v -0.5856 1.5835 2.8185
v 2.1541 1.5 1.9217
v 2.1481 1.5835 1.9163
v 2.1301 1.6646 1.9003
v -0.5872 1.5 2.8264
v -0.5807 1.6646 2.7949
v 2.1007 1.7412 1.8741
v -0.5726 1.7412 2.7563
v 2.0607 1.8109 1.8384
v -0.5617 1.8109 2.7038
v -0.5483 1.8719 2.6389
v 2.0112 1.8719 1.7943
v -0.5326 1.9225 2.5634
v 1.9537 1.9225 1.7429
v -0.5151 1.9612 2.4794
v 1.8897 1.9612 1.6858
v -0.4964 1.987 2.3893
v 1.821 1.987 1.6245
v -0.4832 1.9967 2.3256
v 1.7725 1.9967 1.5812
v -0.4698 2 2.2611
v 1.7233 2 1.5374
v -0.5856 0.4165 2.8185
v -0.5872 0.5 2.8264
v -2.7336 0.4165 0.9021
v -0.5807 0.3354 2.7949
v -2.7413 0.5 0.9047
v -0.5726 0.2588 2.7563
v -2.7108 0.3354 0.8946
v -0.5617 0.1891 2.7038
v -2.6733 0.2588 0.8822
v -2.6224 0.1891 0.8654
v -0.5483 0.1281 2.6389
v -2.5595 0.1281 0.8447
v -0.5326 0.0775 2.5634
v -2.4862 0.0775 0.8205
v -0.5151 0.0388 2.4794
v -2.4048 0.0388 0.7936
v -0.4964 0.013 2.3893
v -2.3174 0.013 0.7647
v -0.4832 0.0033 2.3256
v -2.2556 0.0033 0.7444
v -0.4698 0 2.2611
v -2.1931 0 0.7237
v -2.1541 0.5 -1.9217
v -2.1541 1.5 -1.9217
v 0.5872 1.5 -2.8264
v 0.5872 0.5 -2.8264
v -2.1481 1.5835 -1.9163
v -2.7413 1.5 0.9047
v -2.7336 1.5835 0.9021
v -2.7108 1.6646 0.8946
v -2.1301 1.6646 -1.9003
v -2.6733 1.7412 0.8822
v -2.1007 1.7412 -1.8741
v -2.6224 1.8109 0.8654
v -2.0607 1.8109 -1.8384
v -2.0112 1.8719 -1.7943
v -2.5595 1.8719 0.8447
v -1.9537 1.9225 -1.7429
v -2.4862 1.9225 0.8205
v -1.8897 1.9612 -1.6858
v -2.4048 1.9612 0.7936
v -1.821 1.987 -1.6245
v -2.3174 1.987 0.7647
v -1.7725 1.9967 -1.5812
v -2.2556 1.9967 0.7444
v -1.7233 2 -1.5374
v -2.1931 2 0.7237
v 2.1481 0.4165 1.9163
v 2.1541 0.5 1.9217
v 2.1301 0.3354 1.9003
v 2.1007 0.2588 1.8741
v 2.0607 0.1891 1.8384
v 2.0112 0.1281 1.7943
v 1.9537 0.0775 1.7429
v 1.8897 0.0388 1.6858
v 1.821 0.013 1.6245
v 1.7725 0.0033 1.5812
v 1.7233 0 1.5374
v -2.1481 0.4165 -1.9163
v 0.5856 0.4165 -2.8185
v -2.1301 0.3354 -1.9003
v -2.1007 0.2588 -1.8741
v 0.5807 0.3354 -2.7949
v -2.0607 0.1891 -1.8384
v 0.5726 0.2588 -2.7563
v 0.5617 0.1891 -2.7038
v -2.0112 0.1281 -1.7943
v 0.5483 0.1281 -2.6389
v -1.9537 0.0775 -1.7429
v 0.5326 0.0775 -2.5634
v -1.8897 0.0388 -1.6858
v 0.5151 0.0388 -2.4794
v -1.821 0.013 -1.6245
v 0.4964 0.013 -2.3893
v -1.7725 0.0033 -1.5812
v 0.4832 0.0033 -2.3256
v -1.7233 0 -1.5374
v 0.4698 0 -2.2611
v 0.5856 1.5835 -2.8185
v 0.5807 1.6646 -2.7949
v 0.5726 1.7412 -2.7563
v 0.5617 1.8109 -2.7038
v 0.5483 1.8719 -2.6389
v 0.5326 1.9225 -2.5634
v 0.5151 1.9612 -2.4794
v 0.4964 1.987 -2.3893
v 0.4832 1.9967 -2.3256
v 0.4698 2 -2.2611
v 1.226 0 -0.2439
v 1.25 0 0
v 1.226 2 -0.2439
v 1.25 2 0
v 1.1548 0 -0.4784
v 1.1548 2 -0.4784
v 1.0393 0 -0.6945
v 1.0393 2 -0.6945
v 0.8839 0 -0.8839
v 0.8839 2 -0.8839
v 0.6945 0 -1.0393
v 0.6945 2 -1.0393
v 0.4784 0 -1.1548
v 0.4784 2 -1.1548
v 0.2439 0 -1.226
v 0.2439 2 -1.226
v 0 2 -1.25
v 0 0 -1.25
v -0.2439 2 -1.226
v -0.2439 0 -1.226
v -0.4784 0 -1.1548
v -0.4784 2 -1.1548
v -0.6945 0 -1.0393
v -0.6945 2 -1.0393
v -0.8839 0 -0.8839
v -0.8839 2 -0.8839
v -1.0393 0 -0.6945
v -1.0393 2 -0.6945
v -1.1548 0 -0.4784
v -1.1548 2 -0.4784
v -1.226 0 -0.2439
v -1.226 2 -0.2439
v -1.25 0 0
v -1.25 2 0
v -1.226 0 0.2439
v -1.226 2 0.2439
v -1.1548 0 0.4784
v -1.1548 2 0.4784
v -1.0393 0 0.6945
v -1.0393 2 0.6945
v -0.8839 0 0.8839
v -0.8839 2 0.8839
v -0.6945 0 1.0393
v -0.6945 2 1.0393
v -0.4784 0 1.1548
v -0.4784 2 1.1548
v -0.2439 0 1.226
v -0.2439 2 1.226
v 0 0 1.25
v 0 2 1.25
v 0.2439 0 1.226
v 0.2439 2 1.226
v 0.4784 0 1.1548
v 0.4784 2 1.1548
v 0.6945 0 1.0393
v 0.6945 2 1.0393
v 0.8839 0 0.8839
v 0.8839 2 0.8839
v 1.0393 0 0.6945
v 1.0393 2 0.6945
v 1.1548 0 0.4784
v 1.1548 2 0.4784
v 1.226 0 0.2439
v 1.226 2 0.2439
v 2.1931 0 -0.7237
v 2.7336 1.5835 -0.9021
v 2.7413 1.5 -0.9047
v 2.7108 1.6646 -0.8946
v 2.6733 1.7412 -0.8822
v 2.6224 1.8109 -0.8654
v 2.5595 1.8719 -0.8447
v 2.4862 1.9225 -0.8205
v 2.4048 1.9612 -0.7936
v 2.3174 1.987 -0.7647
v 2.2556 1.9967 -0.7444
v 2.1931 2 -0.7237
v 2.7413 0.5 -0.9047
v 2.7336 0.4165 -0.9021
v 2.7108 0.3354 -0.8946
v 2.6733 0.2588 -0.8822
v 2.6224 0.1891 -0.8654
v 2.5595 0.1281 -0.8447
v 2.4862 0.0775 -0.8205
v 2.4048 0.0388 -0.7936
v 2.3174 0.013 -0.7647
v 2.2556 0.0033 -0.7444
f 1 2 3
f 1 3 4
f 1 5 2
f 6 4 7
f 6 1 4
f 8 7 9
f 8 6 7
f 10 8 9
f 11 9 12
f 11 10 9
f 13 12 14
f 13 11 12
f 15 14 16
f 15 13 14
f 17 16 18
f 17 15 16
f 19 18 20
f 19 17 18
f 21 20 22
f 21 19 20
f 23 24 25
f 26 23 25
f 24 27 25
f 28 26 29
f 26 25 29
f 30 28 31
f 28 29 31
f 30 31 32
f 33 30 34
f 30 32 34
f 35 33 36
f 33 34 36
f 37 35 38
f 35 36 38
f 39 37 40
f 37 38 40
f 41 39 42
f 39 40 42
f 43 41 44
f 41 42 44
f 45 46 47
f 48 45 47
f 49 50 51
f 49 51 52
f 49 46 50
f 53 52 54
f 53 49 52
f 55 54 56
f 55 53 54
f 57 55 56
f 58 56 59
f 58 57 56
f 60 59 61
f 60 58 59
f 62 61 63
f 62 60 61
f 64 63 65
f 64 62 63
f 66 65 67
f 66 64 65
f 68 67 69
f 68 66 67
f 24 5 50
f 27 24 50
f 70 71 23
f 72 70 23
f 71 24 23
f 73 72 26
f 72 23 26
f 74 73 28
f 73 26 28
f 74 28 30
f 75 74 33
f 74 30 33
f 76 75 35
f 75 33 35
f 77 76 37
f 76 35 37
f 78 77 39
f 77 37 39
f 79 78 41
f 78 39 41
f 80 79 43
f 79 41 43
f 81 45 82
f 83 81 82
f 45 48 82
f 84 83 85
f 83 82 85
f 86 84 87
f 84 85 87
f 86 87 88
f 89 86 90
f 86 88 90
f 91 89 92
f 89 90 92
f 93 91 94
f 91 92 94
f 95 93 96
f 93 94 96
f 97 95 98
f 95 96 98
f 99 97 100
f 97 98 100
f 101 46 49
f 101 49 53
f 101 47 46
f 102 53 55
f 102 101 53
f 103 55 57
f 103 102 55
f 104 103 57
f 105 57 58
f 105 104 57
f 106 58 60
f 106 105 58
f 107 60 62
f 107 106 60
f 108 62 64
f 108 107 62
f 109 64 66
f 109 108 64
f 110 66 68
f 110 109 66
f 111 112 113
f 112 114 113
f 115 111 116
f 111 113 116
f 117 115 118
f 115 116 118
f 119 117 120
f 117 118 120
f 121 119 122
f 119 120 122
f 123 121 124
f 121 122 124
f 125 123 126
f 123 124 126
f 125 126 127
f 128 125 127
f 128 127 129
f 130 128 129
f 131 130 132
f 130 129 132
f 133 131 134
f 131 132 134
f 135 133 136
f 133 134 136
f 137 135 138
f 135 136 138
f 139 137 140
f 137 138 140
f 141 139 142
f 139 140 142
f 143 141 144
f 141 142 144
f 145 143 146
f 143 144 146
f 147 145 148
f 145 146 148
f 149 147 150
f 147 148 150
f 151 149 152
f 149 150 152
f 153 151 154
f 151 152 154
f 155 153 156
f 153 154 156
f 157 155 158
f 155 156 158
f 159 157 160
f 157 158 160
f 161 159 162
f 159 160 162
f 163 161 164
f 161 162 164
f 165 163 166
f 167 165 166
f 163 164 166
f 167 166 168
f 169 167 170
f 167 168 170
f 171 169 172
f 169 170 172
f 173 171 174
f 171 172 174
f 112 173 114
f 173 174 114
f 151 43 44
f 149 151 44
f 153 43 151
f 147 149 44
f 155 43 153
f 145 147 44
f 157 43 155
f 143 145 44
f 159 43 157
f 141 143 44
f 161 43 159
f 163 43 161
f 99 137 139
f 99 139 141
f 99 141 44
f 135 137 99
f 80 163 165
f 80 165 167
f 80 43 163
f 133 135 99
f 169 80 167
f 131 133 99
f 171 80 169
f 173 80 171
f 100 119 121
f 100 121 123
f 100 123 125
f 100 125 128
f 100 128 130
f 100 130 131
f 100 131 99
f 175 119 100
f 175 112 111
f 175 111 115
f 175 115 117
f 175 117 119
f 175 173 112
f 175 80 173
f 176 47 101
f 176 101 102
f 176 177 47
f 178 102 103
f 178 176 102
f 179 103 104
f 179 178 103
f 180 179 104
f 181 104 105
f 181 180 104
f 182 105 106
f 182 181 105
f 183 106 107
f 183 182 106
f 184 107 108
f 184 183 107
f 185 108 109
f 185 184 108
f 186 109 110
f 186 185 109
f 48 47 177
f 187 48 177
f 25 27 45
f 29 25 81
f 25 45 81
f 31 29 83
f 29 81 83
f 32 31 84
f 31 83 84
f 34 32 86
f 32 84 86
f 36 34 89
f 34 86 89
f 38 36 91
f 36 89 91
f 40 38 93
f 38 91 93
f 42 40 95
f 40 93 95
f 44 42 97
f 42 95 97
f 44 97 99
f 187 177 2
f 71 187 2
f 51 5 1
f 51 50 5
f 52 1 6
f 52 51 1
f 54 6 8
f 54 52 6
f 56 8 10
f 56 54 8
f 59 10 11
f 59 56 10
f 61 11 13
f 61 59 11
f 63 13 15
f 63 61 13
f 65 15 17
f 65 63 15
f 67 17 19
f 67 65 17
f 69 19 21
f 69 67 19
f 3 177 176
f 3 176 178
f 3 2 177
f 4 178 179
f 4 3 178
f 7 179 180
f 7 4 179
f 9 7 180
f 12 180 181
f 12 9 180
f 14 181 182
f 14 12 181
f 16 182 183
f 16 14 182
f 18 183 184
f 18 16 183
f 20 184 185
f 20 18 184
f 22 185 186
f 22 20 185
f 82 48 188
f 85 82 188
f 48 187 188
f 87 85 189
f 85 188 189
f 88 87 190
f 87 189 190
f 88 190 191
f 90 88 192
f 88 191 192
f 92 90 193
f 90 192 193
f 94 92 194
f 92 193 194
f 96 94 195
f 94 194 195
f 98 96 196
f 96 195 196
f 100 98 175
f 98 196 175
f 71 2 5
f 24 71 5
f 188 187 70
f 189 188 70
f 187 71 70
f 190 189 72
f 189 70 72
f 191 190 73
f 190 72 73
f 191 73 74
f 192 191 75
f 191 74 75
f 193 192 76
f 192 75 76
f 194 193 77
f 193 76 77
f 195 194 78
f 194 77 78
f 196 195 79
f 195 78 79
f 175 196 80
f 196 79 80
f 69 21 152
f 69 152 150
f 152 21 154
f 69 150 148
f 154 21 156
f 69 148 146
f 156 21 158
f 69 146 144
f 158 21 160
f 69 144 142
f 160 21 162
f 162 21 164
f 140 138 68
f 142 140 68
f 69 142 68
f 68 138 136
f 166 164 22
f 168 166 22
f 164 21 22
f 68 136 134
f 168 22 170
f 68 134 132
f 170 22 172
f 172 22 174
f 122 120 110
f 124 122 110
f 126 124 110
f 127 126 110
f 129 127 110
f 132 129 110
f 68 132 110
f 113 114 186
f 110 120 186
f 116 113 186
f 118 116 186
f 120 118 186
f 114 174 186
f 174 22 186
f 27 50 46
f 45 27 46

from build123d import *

# Parameters (mm, degrees)
F3_R = 0.5
F4_R = 1.25


with BuildPart() as f2:
    # F2: sweep along a path in F1
    with BuildLine(Plane.XY) as f2_path:
        Line((0, 0), (0, 2))
    # F0 (on Front) → F2 (sweep)
    with BuildSketch(Plane.XZ):
        Polygon((-0.5872089498, 2.8263968197), (-2.741335922, 0.904660542), (-2.1541269722, -1.9217362777), (0.5872089498, -2.8263968197), (2.741335922, -0.904660542), (2.1541269722, 1.9217362777), align=None)
    sweep(path=f2_path.line)

    # F3
    f3_edges = [f2.edges().sort_by_distance(p)[0] for p in [
        (-2.447731, 0, -0.508538),
        (-1.664272, 0, 1.865529),
        (0.783459, 0, 2.374067),
        (2.447731, 0, 0.508538),
        (1.664272, 0, -1.865529),
        (-0.783459, 0, -2.374067),
        (-1.664272, 2, 1.865529),
        (0.783459, 2, 2.374067),
        (2.447731, 2, 0.508538),
        (1.664272, 2, -1.865529),
        (-0.783459, 2, -2.374067),
        (-2.447731, 2, -0.508538),
    ]]
    fillet(f3_edges, radius=F3_R)

    # F6: sweep along a path in F5
    with BuildLine(Plane.XY) as f6_path:
        Line((0, -0.6415657117), (0, 2.5134647731))
    # F4 (on Front) → F6 (sweep, cut)
    with BuildSketch(Plane.XZ):
        Circle(F4_R)
    sweep(path=f6_path.line, mode=Mode.SUBTRACT)


solid = f2.part
